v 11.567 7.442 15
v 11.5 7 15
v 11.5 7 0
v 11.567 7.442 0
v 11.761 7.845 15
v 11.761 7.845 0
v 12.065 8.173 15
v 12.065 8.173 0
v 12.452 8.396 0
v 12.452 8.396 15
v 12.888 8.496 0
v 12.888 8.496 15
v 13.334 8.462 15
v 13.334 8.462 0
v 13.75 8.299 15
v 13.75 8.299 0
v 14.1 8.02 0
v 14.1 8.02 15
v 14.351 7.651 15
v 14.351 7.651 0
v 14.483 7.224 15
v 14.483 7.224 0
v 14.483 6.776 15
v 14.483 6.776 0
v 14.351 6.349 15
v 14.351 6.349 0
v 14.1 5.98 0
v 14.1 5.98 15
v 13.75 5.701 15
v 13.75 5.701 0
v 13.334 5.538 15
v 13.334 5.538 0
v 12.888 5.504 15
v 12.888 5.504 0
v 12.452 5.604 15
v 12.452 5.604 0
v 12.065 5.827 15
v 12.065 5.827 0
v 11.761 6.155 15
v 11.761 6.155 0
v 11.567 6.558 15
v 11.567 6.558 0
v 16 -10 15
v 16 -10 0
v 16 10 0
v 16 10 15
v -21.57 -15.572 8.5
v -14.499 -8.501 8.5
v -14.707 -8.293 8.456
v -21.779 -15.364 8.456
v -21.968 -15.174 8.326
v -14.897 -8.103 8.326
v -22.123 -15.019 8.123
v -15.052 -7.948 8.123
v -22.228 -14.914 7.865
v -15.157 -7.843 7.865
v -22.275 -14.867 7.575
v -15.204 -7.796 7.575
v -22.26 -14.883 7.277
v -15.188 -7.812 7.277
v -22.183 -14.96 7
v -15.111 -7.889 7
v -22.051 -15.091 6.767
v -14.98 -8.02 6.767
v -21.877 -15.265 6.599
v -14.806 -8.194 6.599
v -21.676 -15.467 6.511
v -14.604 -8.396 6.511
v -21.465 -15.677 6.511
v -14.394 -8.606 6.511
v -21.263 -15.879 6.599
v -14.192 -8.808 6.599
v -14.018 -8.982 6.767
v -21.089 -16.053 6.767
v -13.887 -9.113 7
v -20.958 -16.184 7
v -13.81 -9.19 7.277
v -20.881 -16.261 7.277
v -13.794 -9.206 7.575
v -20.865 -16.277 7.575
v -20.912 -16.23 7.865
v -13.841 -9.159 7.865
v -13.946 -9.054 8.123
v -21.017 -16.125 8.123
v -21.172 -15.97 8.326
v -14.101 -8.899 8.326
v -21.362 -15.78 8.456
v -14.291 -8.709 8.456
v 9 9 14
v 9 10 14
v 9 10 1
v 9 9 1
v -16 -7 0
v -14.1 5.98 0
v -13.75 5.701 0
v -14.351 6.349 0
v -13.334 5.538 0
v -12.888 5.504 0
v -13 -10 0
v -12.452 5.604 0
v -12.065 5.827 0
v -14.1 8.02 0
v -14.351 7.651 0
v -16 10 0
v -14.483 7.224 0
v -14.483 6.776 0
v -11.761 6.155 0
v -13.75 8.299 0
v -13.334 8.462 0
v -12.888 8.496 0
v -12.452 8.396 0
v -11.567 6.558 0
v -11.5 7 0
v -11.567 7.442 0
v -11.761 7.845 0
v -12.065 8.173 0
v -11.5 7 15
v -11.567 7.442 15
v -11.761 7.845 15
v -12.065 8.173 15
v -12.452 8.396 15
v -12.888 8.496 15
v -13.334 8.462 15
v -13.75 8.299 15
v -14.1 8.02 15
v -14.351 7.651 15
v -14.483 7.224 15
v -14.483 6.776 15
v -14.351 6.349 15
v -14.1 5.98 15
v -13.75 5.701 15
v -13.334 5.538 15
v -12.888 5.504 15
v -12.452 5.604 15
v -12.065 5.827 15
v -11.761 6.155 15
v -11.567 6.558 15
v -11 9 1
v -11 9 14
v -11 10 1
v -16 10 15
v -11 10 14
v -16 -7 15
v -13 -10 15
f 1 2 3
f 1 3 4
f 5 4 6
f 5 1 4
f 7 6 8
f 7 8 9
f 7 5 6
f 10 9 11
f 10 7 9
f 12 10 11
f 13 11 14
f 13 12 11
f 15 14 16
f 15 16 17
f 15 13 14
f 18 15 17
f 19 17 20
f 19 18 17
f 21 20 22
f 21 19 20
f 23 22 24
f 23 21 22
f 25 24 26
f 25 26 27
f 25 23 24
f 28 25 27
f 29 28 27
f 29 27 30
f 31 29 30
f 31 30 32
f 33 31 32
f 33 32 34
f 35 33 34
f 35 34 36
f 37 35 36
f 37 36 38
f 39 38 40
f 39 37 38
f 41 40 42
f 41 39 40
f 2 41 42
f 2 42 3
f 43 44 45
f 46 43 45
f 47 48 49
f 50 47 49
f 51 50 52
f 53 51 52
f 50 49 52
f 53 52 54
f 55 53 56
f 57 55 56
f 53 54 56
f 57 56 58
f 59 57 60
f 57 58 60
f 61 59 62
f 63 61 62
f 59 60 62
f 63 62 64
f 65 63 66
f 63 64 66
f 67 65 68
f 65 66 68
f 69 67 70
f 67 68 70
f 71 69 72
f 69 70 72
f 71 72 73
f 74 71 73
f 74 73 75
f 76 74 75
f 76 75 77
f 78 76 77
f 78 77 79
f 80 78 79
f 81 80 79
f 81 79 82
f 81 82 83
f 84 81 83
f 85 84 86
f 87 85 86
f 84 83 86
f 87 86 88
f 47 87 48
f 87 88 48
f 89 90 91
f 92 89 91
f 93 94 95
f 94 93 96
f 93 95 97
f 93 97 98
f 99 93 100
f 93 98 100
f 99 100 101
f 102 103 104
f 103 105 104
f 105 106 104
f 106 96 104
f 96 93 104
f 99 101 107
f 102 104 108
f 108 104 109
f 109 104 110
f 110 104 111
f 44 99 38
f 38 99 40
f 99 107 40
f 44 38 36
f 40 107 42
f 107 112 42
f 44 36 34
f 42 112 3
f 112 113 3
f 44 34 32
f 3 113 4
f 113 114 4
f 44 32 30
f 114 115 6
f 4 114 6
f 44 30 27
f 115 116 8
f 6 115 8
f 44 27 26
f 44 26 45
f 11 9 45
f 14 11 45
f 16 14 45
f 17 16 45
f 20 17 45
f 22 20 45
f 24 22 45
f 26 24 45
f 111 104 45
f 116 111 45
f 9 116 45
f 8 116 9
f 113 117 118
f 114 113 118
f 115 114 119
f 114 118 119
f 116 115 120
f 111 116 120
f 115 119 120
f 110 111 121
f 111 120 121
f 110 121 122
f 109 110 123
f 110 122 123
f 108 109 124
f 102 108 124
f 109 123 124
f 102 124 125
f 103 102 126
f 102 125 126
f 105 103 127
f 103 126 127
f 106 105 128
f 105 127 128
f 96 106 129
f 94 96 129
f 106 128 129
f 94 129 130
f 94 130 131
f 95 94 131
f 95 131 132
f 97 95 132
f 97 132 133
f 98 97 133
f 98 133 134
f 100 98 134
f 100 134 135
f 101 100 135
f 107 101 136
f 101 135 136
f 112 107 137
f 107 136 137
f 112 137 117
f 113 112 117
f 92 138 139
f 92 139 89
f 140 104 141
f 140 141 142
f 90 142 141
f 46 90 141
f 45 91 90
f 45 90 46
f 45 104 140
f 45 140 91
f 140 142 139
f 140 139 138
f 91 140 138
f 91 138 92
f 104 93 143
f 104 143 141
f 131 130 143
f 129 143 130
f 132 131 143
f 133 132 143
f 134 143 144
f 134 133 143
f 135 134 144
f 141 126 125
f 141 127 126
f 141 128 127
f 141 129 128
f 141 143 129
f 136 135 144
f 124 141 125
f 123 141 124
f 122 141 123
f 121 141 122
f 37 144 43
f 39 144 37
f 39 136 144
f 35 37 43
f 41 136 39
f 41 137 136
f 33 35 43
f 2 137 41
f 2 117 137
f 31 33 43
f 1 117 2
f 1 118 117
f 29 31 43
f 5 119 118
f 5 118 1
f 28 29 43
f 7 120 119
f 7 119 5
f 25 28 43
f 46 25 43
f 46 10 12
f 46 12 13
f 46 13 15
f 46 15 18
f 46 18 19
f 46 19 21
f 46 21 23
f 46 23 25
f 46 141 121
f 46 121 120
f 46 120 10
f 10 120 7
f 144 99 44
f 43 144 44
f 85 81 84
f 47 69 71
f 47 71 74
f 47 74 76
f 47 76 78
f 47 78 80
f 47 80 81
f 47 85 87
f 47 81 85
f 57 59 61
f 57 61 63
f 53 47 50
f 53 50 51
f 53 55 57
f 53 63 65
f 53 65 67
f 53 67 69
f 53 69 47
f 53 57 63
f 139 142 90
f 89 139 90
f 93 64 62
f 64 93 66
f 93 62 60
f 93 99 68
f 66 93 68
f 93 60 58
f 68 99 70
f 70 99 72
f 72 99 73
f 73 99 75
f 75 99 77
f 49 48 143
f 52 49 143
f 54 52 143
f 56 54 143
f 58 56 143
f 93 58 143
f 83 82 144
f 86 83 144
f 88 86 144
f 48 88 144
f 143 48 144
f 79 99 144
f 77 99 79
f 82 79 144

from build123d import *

# Parameters (mm, degrees)
ESQUISSE2_W             = 32
ESQUISSE2_H             = 20
BOSS_EXTRU_1_DEPTH      = 15
ESQUISSE3_R             = 1.5
ENL_V_MAT_EXTRU_1_DEPTH = 15
CHANFREIN1_SIZE         = 3
ESQUISSE5_R             = 1
BOSS_EXTRU_2_DEPTH      = 10
ESQUISSE6_W             = 20
ESQUISSE6_H             = 13
ENL_V_MAT_EXTRU_2_DEPTH = 1


with BuildPart() as part:
    # Esquisse2 → Boss.-Extru.1 (new body)
    with BuildSketch(Plane.XY):
        Rectangle(ESQUISSE2_W, ESQUISSE2_H)
    extrude(amount=BOSS_EXTRU_1_DEPTH)

    # Esquisse3 → Enlèv. mat.-Extru.1 (cut)
    with BuildSketch(Plane.XY.offset(15)):
        with Locations((-13, 7)):
            Circle(ESQUISSE3_R)
    enl_v_mat_extru_1 = extrude(amount=-ENL_V_MAT_EXTRU_1_DEPTH, mode=Mode.SUBTRACT)

    # Symétrie1: Enlèv. mat.-Extru.1 across plane
    add(enl_v_mat_extru_1.mirror(Plane(origin=(0, 0, 0), x_dir=(0, 0, 1), z_dir=(1, 0, 0))), mode=Mode.SUBTRACT)

    # Chanfrein1
    chanfrein1_edges = [part.edges().sort_by_distance(p)[0] for p in [
        (-16, -10, 7.5),
    ]]
    chamfer(chanfrein1_edges, length=CHANFREIN1_SIZE)

    # Esquisse5 → Boss.-Extru.2 (add)
    with BuildSketch(Plane(origin=(-11.5, -11.5, 0), x_dir=(0, 0, 1), z_dir=(-0.707106781, -0.707106781, 0))):
        with Locations((7.5, 4.241320344)):
            Circle(ESQUISSE5_R)
    extrude(amount=BOSS_EXTRU_2_DEPTH)

    # Esquisse6 → Enlèv. mat.-Extru.2 (cut)
    with BuildSketch(Plane(origin=(0, 10, 0), x_dir=(1, 0, 0), z_dir=(0, 1, 0))):
        with Locations((-1, -7.5)):
            Rectangle(ESQUISSE6_W, ESQUISSE6_H)
    extrude(amount=-ENL_V_MAT_EXTRU_2_DEPTH, mode=Mode.SUBTRACT)


solid = part.part
